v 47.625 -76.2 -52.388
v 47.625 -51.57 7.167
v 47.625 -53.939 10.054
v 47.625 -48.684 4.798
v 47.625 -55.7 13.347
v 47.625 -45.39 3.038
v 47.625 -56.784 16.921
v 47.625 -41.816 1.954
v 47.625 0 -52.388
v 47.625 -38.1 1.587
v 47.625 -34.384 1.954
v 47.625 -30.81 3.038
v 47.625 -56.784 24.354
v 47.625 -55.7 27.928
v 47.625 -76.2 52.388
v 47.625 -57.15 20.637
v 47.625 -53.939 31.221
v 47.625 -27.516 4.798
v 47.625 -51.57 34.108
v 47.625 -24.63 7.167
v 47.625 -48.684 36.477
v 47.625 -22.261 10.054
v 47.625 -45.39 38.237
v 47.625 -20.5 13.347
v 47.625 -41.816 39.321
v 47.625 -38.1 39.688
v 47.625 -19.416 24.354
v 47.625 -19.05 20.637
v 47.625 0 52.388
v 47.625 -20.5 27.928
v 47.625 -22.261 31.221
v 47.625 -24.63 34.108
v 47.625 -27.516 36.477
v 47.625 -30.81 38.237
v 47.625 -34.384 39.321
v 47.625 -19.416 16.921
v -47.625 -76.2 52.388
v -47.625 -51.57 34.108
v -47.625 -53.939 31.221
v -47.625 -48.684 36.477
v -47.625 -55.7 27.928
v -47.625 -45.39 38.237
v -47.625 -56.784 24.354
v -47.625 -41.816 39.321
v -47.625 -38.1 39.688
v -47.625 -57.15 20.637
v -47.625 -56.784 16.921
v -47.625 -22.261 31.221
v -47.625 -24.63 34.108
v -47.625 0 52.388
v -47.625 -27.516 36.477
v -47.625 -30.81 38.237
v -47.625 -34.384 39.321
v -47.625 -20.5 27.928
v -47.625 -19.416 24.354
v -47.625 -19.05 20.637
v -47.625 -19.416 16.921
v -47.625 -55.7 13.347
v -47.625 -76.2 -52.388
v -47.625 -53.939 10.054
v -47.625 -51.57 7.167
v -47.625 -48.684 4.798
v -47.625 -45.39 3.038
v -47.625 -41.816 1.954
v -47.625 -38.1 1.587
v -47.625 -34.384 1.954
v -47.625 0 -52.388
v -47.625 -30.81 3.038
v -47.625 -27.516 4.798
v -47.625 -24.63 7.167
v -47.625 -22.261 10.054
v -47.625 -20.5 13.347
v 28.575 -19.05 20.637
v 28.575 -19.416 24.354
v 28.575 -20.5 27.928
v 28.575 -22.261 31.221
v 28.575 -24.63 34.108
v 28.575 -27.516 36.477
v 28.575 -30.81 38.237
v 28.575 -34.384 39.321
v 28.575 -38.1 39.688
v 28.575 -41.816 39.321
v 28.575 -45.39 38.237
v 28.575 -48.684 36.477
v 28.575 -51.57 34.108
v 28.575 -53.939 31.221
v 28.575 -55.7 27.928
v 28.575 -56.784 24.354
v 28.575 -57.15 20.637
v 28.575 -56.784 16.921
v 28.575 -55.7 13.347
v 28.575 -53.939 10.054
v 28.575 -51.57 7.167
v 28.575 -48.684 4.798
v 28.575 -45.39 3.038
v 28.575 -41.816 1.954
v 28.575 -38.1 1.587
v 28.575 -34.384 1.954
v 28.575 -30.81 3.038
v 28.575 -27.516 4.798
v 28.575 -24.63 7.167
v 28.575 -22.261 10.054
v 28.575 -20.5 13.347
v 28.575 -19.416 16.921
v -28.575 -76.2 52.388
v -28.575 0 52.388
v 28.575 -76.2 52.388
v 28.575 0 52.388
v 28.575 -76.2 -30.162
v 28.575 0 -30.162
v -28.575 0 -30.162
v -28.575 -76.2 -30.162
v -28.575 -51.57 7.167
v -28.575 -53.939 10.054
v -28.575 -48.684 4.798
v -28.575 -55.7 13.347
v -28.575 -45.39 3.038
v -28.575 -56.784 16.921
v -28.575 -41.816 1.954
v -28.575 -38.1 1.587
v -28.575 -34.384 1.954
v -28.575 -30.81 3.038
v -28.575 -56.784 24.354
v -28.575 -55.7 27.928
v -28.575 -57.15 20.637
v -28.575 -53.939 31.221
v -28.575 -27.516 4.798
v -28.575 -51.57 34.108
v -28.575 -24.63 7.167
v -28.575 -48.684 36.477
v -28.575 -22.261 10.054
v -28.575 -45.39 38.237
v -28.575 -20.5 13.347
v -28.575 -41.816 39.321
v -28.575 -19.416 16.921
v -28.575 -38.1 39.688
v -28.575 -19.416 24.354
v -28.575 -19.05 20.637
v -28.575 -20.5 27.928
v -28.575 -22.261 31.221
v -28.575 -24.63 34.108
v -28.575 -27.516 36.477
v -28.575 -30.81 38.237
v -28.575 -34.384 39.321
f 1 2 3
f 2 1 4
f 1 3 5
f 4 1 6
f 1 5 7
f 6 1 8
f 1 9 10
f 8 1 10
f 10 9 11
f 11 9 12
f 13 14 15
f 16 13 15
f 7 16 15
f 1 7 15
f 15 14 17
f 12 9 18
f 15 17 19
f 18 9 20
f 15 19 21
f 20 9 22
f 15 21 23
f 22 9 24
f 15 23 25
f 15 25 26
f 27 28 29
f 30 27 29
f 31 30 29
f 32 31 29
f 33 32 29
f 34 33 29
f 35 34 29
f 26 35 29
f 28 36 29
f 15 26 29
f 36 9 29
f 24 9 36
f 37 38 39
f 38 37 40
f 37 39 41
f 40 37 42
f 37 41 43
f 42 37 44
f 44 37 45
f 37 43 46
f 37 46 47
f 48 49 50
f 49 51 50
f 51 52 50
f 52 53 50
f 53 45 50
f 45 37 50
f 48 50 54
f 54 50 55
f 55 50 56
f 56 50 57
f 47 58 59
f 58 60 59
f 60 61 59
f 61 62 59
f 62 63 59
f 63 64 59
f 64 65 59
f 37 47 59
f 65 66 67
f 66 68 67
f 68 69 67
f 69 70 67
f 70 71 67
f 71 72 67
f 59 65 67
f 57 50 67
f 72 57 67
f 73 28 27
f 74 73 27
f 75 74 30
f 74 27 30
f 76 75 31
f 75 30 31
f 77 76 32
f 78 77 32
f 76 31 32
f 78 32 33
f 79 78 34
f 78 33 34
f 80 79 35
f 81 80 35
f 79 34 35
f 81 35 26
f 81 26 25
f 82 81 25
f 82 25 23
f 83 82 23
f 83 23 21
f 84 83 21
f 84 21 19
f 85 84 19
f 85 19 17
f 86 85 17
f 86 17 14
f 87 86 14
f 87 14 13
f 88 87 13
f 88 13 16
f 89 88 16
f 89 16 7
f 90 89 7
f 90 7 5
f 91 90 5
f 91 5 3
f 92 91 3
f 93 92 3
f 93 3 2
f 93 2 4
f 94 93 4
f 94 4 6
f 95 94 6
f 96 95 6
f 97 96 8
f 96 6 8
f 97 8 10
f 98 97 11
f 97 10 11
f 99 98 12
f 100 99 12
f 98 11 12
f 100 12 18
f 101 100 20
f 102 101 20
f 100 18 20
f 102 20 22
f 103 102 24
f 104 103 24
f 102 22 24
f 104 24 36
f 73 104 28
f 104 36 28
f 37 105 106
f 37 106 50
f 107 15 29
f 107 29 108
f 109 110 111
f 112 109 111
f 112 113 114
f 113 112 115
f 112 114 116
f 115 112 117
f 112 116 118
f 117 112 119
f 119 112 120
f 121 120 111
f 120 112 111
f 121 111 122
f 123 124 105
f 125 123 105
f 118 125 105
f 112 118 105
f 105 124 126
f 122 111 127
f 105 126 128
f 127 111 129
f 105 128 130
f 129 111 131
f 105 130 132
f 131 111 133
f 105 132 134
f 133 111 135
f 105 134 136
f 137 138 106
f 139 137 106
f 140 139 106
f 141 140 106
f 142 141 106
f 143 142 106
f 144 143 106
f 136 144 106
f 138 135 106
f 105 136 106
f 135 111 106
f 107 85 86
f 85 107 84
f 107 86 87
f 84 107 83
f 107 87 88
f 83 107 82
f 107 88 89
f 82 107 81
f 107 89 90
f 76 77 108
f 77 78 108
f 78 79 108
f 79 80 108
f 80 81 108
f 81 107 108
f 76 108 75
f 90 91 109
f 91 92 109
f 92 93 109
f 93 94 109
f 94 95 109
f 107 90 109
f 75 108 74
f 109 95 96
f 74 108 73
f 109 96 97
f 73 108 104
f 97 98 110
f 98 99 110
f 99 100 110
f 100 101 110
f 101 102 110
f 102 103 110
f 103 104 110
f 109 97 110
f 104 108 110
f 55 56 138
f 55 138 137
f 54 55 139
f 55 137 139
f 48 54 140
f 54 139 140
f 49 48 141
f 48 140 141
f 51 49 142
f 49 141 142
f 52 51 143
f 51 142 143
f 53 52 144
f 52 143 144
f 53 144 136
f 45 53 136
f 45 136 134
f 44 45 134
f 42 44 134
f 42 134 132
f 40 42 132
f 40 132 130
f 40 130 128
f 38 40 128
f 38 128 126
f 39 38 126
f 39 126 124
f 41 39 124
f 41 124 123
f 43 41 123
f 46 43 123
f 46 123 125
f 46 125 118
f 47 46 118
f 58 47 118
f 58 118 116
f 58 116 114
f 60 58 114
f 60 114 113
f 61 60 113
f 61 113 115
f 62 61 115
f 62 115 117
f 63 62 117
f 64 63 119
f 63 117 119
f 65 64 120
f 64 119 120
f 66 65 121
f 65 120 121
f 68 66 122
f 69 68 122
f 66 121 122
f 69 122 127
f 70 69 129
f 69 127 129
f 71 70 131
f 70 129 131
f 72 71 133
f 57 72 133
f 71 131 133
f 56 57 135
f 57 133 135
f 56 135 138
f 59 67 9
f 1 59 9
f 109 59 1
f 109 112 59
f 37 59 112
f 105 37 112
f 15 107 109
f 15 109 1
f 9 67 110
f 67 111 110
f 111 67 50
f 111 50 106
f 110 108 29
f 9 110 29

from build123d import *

# Parameters (mm, degrees)
F1_DEPTH = 76.2
F3_D     = 38.1


with BuildPart() as f1:
    # F0 (on Front) → F1 (new body)
    with BuildSketch(Plane.XZ):
        Polygon((-47.625, 52.3875), (-47.625, -52.3875), (47.625, -52.3875), (47.625, 52.3875), (28.575, 52.3875), (28.575, -30.1625), (-28.575, -30.1625), (-28.575, 52.3875), align=None)
    extrude(amount=F1_DEPTH)

    # F3 (through all)
    with Locations(Plane(origin=(-47.625, 0, 0), x_dir=(0, -1, 0), z_dir=(-1, 0, 0))):
        with Locations((38.1, 20.6375)):
            Hole(F3_D / 2)


solid = f1.part
